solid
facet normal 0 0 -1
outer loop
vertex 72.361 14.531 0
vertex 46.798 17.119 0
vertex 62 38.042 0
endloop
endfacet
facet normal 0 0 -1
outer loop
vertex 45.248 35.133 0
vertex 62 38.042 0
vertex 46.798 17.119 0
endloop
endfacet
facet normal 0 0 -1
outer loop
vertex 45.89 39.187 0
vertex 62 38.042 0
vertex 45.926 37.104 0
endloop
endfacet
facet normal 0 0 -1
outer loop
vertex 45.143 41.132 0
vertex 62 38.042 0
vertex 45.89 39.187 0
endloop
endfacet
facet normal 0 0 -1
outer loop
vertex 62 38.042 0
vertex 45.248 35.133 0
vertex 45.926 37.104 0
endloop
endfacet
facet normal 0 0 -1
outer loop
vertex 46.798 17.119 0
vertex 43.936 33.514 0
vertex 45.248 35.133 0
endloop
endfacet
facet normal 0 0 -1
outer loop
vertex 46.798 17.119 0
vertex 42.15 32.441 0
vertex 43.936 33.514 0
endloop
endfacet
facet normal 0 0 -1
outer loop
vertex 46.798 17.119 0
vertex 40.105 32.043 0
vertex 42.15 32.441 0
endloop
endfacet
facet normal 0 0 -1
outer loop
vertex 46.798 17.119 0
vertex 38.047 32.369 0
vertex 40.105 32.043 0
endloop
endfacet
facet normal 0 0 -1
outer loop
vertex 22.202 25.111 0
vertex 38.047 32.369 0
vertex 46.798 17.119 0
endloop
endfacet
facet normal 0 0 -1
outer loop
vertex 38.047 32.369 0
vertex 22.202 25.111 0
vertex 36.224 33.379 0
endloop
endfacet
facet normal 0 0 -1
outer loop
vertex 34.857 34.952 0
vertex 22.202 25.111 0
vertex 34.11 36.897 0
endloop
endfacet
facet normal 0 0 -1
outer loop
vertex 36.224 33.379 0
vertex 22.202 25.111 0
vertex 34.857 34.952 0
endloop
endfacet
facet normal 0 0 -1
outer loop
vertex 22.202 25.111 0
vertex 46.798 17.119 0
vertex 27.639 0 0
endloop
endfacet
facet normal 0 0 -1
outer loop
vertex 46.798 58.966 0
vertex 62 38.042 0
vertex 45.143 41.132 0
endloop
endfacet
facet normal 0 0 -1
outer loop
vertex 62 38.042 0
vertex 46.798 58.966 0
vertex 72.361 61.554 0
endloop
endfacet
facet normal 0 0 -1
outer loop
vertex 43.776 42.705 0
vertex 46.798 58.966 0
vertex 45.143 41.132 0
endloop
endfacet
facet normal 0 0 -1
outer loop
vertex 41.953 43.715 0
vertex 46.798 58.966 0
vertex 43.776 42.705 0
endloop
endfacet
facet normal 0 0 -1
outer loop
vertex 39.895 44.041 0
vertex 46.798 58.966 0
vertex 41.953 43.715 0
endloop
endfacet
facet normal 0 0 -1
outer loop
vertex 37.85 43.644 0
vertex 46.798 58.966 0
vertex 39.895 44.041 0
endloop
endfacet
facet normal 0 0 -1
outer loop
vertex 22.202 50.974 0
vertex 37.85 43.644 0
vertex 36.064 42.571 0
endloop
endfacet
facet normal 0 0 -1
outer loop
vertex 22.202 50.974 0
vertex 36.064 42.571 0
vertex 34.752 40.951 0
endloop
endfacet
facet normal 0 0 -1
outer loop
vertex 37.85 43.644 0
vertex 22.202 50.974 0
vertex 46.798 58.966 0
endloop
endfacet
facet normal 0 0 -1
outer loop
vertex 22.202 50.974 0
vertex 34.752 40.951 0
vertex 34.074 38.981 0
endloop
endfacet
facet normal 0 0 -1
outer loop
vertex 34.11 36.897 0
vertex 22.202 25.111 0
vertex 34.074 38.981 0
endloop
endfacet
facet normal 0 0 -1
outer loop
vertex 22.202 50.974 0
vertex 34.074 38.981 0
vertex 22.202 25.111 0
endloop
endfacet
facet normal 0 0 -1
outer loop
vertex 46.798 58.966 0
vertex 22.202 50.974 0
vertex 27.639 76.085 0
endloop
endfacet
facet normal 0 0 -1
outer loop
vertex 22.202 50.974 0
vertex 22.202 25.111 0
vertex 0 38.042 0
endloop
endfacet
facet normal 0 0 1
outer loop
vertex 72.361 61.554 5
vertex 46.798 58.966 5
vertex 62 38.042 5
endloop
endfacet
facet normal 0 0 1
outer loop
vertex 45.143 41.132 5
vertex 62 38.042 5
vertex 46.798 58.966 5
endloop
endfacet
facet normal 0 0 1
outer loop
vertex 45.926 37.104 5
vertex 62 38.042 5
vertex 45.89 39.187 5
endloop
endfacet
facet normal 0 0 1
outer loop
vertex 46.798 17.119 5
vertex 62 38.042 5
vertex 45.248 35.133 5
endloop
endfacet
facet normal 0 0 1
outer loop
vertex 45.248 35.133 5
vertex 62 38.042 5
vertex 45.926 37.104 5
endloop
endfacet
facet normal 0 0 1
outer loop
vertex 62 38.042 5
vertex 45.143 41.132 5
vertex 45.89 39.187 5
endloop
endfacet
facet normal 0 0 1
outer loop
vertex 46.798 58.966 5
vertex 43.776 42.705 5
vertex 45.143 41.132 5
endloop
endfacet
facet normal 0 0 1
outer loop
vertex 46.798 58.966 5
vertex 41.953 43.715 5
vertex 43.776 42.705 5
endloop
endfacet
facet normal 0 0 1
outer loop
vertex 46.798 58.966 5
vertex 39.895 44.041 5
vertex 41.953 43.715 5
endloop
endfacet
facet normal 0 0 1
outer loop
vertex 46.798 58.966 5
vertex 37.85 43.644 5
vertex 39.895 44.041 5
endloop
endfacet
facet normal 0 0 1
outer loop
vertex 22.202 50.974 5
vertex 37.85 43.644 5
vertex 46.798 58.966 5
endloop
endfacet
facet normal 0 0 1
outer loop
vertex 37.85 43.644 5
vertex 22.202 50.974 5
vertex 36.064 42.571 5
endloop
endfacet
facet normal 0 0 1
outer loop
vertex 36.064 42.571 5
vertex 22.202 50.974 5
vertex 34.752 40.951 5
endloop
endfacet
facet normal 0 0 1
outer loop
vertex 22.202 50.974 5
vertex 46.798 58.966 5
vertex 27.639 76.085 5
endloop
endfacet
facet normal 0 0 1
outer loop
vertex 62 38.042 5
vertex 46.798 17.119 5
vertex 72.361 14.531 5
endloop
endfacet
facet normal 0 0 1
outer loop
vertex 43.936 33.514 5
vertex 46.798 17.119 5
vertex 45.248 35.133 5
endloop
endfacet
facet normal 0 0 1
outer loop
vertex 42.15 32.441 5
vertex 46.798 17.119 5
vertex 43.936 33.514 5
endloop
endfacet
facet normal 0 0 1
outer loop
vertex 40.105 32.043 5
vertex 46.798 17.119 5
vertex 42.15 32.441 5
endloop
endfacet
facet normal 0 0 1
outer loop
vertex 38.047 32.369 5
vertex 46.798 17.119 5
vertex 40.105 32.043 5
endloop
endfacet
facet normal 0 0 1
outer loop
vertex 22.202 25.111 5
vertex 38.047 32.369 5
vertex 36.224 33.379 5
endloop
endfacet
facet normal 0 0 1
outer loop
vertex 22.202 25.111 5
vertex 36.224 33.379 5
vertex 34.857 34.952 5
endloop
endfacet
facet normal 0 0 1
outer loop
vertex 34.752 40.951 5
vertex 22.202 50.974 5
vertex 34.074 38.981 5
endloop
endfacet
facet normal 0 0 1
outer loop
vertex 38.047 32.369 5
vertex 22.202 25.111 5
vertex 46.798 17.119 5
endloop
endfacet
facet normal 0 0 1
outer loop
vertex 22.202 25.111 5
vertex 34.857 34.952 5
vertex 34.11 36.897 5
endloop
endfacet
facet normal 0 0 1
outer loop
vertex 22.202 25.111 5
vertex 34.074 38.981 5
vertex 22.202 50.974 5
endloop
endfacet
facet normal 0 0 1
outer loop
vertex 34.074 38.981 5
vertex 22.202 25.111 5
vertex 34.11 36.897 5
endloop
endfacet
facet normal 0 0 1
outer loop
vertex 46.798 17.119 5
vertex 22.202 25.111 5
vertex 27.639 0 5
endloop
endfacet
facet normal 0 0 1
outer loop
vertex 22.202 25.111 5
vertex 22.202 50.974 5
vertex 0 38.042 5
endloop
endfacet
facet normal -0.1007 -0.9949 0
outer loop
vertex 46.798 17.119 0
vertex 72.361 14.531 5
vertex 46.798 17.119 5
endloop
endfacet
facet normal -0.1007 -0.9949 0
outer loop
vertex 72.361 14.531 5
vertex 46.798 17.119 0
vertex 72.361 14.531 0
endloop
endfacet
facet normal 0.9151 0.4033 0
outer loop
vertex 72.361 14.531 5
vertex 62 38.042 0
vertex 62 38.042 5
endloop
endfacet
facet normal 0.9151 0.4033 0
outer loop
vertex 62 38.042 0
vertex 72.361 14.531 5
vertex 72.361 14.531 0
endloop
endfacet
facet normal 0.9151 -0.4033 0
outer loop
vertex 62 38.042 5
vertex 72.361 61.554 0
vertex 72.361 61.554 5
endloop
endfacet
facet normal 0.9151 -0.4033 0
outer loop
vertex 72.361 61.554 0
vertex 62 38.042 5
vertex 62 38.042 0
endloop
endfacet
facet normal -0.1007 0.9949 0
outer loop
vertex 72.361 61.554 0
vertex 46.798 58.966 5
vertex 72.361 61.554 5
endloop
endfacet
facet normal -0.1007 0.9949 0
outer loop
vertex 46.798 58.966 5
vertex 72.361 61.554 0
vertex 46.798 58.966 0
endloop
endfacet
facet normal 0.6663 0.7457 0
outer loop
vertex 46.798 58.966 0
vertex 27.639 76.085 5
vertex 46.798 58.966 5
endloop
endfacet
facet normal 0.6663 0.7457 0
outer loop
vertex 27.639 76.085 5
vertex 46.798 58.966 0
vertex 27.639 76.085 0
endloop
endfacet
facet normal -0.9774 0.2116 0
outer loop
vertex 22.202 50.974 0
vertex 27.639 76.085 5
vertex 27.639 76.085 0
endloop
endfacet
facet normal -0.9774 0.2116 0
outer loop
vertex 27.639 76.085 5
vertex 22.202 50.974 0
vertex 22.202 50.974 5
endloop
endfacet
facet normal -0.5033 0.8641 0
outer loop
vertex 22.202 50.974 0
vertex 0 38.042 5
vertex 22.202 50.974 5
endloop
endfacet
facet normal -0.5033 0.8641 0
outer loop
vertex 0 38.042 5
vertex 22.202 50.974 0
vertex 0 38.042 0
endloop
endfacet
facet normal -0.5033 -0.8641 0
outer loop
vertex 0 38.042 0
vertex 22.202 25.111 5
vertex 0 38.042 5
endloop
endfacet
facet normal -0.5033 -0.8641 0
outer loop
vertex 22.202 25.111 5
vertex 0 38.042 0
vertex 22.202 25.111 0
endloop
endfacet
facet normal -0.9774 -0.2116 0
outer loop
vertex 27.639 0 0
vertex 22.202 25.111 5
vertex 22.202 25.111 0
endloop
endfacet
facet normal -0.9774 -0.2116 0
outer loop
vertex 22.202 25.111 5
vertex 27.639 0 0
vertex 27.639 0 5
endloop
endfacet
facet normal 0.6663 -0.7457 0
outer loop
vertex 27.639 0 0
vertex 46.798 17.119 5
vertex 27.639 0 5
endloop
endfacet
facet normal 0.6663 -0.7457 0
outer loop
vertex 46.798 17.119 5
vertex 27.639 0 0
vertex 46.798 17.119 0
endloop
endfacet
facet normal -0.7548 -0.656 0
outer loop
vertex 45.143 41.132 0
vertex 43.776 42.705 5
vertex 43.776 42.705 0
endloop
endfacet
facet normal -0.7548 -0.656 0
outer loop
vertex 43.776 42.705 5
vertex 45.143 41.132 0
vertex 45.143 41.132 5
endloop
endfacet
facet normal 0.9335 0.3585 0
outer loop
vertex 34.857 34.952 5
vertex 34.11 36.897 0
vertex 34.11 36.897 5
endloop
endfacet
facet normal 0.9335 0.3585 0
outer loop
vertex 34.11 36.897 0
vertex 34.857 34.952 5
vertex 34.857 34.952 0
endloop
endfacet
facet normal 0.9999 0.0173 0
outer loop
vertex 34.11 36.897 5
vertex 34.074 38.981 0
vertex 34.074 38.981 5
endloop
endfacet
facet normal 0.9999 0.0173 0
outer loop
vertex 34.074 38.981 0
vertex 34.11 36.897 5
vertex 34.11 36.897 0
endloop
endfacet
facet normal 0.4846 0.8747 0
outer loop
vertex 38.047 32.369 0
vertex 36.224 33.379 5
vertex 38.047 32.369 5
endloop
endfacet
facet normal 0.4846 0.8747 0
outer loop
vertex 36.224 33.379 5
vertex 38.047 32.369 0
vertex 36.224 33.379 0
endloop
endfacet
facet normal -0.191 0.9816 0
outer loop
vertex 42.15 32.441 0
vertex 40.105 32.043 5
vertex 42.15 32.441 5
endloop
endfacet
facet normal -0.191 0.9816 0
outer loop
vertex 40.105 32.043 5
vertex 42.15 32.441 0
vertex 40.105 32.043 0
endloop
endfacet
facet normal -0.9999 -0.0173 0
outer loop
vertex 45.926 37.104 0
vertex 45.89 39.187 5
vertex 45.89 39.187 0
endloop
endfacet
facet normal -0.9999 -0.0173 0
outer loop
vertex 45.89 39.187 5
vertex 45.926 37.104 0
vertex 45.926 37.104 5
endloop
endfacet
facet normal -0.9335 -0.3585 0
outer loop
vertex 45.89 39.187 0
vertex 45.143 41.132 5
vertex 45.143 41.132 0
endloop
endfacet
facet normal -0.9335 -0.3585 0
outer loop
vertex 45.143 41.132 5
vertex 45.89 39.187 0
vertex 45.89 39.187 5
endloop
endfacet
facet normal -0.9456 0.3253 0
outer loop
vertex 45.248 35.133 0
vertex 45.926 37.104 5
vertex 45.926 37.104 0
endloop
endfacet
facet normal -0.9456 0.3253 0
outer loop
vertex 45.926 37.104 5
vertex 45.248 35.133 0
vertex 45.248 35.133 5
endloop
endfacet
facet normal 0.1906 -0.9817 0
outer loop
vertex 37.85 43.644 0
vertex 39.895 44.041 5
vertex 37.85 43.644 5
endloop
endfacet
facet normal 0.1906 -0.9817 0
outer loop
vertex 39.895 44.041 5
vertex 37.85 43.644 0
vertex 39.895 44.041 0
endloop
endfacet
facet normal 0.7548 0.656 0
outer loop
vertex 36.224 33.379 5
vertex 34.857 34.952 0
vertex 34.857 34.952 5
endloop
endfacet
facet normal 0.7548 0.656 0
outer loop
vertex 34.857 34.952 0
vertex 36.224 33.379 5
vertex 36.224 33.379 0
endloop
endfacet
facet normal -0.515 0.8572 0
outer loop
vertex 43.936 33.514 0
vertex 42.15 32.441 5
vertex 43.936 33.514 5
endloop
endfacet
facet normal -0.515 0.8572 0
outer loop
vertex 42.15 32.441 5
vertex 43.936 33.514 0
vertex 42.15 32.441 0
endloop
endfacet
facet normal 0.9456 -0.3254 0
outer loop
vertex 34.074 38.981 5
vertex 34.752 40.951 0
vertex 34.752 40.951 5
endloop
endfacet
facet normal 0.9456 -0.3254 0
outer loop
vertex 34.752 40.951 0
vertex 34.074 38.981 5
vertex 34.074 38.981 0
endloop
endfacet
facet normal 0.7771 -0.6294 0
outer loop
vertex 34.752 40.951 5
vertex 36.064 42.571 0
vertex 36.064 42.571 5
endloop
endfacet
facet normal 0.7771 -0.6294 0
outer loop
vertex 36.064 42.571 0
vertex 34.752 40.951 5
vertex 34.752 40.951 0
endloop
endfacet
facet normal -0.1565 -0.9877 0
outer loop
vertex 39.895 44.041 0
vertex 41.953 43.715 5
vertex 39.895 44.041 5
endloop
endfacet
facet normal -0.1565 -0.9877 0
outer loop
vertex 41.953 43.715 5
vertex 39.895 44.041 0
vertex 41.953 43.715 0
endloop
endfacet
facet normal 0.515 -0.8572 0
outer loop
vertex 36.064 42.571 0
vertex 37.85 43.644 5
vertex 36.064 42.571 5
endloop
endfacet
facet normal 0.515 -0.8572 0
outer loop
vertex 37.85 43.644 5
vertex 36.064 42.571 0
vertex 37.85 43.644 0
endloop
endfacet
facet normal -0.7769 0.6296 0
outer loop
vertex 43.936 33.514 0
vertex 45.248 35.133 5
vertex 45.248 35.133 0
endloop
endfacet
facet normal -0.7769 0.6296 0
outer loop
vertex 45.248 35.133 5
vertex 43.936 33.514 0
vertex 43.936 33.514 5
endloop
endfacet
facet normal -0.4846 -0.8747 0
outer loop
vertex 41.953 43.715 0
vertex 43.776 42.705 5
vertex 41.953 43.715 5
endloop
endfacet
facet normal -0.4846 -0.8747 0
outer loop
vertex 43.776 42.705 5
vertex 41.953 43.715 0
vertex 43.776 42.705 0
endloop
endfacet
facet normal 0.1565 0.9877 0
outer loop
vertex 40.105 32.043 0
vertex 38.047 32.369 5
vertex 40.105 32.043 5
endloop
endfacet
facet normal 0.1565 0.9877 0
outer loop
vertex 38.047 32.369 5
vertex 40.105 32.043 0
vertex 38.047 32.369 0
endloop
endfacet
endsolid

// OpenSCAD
$fn = 32;

// ----------------------------------------------------------------------
// Star wheel: 5-point star, R40
// ----------------------------------------------------------------------

// --- parameters (mm) ---
n_points = 5;             // number of points / teeth
r_out = 40;               // tip radius
r_in = 22;                // root radius
bore_r = 6;               // centre bore radius
plate_t = 5;              // plate thickness, Z (extrusion height)
bore_d = 12;              // centre bore diameter

profile = [[0, 38.042], [22.202, 25.111], [27.639, 0], [46.798, 17.119], [72.361, 14.531], [62, 38.042], [72.361, 61.554], [46.798, 58.966], [27.639, 76.085], [22.202, 50.974]];  // primary outline, 10 points, counter clockwise
void_1 = [[45.89, 39.187], [45.143, 41.132], [43.776, 42.705], [41.953, 43.715], [39.895, 44.041], [37.85, 43.644], [36.064, 42.571], [34.752, 40.951], [34.074, 38.981], [34.11, 36.897], [34.857, 34.952], [36.224, 33.379], [38.047, 32.369], [40.105, 32.043], [42.15, 32.441], [43.936, 33.514], [45.248, 35.133], [45.926, 37.104]];  // centre bore, 18 points

// --- the one profile operation ---
difference() {
  linear_extrude(height = plate_t) polygon(points = profile);
  translate([0, 0, -1])
    linear_extrude(height = plate_t + 2) polygon(points = void_1);
}
